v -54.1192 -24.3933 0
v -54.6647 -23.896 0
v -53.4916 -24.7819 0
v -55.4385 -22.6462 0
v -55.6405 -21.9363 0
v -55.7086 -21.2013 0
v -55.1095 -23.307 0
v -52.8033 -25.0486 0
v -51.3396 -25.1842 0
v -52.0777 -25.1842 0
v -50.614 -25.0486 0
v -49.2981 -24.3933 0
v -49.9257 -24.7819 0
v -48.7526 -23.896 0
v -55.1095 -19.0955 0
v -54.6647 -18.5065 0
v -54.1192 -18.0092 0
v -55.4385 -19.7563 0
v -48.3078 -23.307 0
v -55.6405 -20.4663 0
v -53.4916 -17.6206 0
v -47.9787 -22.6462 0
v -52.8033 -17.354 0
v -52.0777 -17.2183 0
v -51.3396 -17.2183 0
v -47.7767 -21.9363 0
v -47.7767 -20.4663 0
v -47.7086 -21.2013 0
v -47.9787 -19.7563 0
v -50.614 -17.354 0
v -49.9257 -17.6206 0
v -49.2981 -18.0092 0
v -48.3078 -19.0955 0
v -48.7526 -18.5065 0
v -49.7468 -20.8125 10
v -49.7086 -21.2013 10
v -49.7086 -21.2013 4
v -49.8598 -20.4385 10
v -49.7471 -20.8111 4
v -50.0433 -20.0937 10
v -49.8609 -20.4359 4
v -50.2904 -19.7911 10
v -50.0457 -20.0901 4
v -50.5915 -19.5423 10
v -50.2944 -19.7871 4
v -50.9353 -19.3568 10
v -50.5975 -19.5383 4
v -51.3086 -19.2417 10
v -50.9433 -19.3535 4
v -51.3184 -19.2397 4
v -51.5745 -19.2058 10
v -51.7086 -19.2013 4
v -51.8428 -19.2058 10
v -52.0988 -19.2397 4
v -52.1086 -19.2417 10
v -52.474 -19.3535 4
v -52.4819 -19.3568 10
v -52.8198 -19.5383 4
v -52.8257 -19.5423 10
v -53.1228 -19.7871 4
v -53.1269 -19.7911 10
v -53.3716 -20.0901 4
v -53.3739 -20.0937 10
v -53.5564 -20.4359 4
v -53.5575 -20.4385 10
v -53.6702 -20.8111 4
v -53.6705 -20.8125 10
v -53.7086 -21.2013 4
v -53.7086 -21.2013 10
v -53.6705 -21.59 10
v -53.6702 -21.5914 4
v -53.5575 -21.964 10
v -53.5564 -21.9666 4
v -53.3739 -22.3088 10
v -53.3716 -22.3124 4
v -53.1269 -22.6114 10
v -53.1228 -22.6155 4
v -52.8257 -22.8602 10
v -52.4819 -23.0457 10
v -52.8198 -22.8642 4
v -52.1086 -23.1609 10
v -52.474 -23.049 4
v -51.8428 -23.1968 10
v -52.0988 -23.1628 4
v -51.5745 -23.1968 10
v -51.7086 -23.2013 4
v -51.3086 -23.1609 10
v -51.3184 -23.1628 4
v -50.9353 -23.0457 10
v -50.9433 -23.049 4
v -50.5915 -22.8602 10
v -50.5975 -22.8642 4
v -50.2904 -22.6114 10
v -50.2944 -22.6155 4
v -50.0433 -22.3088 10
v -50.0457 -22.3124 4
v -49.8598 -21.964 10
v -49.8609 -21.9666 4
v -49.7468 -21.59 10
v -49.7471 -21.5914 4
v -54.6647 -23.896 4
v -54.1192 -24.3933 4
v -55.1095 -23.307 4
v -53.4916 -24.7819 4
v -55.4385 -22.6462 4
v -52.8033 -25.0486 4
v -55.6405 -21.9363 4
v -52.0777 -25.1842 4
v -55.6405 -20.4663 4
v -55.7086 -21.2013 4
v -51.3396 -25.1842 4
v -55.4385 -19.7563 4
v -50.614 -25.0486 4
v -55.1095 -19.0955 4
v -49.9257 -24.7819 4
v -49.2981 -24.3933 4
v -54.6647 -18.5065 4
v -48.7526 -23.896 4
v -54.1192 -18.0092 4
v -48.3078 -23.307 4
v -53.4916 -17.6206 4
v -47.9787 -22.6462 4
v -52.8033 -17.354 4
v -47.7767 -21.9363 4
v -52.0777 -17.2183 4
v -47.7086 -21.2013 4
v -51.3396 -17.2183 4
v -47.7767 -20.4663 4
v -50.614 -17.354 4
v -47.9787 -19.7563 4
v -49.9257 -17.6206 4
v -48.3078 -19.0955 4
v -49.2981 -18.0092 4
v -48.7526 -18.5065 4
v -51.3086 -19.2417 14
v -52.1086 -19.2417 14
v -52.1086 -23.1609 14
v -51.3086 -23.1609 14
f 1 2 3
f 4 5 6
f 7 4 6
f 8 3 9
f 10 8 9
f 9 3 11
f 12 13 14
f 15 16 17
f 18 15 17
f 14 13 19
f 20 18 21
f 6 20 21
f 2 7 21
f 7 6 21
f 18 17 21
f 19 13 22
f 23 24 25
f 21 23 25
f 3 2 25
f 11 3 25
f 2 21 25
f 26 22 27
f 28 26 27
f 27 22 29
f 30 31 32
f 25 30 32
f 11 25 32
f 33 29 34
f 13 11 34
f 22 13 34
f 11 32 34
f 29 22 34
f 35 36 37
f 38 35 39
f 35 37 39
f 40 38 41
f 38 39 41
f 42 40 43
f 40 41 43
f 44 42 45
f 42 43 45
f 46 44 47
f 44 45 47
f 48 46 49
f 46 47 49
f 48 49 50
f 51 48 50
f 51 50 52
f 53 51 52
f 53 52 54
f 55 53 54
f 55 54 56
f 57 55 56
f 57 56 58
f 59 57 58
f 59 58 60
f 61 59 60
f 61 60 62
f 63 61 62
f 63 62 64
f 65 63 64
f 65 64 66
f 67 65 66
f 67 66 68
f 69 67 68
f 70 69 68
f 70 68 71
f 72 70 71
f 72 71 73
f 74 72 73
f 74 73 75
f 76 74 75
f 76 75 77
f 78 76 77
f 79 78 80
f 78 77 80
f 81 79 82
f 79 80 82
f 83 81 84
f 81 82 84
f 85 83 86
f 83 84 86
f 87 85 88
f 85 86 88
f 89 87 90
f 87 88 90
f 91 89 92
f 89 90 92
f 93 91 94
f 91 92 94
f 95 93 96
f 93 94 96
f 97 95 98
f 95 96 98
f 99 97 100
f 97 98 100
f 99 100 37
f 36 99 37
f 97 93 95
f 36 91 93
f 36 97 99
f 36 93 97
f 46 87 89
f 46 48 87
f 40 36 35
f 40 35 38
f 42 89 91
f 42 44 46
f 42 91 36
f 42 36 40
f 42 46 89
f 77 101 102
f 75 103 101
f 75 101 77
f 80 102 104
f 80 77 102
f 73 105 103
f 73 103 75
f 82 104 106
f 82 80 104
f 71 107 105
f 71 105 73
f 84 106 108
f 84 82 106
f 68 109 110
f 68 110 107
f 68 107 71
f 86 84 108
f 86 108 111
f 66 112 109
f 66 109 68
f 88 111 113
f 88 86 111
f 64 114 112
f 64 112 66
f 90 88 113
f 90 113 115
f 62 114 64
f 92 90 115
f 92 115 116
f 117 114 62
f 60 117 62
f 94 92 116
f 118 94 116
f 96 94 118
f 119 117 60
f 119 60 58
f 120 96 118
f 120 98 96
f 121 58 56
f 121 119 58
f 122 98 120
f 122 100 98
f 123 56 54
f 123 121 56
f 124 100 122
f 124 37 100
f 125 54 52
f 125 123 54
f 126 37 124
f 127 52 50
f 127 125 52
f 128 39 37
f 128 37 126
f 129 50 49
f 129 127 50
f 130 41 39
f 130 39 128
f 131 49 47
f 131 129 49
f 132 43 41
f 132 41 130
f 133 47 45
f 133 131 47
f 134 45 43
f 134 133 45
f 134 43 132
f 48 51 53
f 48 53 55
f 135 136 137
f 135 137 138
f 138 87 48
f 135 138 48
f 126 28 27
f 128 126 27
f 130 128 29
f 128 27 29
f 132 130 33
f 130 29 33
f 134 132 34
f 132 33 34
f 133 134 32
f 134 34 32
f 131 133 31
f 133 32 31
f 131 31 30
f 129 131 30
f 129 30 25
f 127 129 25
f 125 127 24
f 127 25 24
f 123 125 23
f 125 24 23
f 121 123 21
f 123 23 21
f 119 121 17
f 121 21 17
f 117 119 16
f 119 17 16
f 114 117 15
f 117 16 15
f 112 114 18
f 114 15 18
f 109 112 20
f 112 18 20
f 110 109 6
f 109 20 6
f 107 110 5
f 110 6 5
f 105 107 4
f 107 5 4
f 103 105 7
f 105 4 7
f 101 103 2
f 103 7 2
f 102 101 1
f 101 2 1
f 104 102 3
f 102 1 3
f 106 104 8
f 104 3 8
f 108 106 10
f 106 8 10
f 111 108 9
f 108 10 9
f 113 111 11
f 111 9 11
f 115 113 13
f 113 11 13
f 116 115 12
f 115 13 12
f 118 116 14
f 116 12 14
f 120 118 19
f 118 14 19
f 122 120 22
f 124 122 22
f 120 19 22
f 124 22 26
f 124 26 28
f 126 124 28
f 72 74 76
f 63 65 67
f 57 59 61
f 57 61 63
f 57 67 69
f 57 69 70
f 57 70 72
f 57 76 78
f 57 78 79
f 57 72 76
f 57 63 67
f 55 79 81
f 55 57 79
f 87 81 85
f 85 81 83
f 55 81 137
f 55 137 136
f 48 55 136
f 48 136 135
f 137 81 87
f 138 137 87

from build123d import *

# Parameters (mm, degrees)
F0_R     = 4
F1_DEPTH = 4
F2_R     = 2
F3_DEPTH = 6
F4_W     = 0.8
F4_H     = 3.919184
F5_DEPTH = 4


with BuildPart() as f1:
    # F0 (on Top) → F1 (new body)
    with BuildSketch(Plane.XY):
        with Locations((-51.708624, -21.201266)):
            Circle(F0_R)
    extrude(amount=F1_DEPTH)

    # F2 (on face) → F3 (join)
    with BuildSketch(Plane.XY.offset(4)):
        with Locations((-51.708624, -21.201266)):
            Circle(F2_R)
    extrude(amount=F3_DEPTH)

    # F4 (on face) → F5 (join)
    with BuildSketch(Plane.XY.offset(10)):
        with Locations((-51.708624, -21.201266)):
            Rectangle(F4_W, F4_H)
    extrude(amount=F5_DEPTH)


solid = f1.part
